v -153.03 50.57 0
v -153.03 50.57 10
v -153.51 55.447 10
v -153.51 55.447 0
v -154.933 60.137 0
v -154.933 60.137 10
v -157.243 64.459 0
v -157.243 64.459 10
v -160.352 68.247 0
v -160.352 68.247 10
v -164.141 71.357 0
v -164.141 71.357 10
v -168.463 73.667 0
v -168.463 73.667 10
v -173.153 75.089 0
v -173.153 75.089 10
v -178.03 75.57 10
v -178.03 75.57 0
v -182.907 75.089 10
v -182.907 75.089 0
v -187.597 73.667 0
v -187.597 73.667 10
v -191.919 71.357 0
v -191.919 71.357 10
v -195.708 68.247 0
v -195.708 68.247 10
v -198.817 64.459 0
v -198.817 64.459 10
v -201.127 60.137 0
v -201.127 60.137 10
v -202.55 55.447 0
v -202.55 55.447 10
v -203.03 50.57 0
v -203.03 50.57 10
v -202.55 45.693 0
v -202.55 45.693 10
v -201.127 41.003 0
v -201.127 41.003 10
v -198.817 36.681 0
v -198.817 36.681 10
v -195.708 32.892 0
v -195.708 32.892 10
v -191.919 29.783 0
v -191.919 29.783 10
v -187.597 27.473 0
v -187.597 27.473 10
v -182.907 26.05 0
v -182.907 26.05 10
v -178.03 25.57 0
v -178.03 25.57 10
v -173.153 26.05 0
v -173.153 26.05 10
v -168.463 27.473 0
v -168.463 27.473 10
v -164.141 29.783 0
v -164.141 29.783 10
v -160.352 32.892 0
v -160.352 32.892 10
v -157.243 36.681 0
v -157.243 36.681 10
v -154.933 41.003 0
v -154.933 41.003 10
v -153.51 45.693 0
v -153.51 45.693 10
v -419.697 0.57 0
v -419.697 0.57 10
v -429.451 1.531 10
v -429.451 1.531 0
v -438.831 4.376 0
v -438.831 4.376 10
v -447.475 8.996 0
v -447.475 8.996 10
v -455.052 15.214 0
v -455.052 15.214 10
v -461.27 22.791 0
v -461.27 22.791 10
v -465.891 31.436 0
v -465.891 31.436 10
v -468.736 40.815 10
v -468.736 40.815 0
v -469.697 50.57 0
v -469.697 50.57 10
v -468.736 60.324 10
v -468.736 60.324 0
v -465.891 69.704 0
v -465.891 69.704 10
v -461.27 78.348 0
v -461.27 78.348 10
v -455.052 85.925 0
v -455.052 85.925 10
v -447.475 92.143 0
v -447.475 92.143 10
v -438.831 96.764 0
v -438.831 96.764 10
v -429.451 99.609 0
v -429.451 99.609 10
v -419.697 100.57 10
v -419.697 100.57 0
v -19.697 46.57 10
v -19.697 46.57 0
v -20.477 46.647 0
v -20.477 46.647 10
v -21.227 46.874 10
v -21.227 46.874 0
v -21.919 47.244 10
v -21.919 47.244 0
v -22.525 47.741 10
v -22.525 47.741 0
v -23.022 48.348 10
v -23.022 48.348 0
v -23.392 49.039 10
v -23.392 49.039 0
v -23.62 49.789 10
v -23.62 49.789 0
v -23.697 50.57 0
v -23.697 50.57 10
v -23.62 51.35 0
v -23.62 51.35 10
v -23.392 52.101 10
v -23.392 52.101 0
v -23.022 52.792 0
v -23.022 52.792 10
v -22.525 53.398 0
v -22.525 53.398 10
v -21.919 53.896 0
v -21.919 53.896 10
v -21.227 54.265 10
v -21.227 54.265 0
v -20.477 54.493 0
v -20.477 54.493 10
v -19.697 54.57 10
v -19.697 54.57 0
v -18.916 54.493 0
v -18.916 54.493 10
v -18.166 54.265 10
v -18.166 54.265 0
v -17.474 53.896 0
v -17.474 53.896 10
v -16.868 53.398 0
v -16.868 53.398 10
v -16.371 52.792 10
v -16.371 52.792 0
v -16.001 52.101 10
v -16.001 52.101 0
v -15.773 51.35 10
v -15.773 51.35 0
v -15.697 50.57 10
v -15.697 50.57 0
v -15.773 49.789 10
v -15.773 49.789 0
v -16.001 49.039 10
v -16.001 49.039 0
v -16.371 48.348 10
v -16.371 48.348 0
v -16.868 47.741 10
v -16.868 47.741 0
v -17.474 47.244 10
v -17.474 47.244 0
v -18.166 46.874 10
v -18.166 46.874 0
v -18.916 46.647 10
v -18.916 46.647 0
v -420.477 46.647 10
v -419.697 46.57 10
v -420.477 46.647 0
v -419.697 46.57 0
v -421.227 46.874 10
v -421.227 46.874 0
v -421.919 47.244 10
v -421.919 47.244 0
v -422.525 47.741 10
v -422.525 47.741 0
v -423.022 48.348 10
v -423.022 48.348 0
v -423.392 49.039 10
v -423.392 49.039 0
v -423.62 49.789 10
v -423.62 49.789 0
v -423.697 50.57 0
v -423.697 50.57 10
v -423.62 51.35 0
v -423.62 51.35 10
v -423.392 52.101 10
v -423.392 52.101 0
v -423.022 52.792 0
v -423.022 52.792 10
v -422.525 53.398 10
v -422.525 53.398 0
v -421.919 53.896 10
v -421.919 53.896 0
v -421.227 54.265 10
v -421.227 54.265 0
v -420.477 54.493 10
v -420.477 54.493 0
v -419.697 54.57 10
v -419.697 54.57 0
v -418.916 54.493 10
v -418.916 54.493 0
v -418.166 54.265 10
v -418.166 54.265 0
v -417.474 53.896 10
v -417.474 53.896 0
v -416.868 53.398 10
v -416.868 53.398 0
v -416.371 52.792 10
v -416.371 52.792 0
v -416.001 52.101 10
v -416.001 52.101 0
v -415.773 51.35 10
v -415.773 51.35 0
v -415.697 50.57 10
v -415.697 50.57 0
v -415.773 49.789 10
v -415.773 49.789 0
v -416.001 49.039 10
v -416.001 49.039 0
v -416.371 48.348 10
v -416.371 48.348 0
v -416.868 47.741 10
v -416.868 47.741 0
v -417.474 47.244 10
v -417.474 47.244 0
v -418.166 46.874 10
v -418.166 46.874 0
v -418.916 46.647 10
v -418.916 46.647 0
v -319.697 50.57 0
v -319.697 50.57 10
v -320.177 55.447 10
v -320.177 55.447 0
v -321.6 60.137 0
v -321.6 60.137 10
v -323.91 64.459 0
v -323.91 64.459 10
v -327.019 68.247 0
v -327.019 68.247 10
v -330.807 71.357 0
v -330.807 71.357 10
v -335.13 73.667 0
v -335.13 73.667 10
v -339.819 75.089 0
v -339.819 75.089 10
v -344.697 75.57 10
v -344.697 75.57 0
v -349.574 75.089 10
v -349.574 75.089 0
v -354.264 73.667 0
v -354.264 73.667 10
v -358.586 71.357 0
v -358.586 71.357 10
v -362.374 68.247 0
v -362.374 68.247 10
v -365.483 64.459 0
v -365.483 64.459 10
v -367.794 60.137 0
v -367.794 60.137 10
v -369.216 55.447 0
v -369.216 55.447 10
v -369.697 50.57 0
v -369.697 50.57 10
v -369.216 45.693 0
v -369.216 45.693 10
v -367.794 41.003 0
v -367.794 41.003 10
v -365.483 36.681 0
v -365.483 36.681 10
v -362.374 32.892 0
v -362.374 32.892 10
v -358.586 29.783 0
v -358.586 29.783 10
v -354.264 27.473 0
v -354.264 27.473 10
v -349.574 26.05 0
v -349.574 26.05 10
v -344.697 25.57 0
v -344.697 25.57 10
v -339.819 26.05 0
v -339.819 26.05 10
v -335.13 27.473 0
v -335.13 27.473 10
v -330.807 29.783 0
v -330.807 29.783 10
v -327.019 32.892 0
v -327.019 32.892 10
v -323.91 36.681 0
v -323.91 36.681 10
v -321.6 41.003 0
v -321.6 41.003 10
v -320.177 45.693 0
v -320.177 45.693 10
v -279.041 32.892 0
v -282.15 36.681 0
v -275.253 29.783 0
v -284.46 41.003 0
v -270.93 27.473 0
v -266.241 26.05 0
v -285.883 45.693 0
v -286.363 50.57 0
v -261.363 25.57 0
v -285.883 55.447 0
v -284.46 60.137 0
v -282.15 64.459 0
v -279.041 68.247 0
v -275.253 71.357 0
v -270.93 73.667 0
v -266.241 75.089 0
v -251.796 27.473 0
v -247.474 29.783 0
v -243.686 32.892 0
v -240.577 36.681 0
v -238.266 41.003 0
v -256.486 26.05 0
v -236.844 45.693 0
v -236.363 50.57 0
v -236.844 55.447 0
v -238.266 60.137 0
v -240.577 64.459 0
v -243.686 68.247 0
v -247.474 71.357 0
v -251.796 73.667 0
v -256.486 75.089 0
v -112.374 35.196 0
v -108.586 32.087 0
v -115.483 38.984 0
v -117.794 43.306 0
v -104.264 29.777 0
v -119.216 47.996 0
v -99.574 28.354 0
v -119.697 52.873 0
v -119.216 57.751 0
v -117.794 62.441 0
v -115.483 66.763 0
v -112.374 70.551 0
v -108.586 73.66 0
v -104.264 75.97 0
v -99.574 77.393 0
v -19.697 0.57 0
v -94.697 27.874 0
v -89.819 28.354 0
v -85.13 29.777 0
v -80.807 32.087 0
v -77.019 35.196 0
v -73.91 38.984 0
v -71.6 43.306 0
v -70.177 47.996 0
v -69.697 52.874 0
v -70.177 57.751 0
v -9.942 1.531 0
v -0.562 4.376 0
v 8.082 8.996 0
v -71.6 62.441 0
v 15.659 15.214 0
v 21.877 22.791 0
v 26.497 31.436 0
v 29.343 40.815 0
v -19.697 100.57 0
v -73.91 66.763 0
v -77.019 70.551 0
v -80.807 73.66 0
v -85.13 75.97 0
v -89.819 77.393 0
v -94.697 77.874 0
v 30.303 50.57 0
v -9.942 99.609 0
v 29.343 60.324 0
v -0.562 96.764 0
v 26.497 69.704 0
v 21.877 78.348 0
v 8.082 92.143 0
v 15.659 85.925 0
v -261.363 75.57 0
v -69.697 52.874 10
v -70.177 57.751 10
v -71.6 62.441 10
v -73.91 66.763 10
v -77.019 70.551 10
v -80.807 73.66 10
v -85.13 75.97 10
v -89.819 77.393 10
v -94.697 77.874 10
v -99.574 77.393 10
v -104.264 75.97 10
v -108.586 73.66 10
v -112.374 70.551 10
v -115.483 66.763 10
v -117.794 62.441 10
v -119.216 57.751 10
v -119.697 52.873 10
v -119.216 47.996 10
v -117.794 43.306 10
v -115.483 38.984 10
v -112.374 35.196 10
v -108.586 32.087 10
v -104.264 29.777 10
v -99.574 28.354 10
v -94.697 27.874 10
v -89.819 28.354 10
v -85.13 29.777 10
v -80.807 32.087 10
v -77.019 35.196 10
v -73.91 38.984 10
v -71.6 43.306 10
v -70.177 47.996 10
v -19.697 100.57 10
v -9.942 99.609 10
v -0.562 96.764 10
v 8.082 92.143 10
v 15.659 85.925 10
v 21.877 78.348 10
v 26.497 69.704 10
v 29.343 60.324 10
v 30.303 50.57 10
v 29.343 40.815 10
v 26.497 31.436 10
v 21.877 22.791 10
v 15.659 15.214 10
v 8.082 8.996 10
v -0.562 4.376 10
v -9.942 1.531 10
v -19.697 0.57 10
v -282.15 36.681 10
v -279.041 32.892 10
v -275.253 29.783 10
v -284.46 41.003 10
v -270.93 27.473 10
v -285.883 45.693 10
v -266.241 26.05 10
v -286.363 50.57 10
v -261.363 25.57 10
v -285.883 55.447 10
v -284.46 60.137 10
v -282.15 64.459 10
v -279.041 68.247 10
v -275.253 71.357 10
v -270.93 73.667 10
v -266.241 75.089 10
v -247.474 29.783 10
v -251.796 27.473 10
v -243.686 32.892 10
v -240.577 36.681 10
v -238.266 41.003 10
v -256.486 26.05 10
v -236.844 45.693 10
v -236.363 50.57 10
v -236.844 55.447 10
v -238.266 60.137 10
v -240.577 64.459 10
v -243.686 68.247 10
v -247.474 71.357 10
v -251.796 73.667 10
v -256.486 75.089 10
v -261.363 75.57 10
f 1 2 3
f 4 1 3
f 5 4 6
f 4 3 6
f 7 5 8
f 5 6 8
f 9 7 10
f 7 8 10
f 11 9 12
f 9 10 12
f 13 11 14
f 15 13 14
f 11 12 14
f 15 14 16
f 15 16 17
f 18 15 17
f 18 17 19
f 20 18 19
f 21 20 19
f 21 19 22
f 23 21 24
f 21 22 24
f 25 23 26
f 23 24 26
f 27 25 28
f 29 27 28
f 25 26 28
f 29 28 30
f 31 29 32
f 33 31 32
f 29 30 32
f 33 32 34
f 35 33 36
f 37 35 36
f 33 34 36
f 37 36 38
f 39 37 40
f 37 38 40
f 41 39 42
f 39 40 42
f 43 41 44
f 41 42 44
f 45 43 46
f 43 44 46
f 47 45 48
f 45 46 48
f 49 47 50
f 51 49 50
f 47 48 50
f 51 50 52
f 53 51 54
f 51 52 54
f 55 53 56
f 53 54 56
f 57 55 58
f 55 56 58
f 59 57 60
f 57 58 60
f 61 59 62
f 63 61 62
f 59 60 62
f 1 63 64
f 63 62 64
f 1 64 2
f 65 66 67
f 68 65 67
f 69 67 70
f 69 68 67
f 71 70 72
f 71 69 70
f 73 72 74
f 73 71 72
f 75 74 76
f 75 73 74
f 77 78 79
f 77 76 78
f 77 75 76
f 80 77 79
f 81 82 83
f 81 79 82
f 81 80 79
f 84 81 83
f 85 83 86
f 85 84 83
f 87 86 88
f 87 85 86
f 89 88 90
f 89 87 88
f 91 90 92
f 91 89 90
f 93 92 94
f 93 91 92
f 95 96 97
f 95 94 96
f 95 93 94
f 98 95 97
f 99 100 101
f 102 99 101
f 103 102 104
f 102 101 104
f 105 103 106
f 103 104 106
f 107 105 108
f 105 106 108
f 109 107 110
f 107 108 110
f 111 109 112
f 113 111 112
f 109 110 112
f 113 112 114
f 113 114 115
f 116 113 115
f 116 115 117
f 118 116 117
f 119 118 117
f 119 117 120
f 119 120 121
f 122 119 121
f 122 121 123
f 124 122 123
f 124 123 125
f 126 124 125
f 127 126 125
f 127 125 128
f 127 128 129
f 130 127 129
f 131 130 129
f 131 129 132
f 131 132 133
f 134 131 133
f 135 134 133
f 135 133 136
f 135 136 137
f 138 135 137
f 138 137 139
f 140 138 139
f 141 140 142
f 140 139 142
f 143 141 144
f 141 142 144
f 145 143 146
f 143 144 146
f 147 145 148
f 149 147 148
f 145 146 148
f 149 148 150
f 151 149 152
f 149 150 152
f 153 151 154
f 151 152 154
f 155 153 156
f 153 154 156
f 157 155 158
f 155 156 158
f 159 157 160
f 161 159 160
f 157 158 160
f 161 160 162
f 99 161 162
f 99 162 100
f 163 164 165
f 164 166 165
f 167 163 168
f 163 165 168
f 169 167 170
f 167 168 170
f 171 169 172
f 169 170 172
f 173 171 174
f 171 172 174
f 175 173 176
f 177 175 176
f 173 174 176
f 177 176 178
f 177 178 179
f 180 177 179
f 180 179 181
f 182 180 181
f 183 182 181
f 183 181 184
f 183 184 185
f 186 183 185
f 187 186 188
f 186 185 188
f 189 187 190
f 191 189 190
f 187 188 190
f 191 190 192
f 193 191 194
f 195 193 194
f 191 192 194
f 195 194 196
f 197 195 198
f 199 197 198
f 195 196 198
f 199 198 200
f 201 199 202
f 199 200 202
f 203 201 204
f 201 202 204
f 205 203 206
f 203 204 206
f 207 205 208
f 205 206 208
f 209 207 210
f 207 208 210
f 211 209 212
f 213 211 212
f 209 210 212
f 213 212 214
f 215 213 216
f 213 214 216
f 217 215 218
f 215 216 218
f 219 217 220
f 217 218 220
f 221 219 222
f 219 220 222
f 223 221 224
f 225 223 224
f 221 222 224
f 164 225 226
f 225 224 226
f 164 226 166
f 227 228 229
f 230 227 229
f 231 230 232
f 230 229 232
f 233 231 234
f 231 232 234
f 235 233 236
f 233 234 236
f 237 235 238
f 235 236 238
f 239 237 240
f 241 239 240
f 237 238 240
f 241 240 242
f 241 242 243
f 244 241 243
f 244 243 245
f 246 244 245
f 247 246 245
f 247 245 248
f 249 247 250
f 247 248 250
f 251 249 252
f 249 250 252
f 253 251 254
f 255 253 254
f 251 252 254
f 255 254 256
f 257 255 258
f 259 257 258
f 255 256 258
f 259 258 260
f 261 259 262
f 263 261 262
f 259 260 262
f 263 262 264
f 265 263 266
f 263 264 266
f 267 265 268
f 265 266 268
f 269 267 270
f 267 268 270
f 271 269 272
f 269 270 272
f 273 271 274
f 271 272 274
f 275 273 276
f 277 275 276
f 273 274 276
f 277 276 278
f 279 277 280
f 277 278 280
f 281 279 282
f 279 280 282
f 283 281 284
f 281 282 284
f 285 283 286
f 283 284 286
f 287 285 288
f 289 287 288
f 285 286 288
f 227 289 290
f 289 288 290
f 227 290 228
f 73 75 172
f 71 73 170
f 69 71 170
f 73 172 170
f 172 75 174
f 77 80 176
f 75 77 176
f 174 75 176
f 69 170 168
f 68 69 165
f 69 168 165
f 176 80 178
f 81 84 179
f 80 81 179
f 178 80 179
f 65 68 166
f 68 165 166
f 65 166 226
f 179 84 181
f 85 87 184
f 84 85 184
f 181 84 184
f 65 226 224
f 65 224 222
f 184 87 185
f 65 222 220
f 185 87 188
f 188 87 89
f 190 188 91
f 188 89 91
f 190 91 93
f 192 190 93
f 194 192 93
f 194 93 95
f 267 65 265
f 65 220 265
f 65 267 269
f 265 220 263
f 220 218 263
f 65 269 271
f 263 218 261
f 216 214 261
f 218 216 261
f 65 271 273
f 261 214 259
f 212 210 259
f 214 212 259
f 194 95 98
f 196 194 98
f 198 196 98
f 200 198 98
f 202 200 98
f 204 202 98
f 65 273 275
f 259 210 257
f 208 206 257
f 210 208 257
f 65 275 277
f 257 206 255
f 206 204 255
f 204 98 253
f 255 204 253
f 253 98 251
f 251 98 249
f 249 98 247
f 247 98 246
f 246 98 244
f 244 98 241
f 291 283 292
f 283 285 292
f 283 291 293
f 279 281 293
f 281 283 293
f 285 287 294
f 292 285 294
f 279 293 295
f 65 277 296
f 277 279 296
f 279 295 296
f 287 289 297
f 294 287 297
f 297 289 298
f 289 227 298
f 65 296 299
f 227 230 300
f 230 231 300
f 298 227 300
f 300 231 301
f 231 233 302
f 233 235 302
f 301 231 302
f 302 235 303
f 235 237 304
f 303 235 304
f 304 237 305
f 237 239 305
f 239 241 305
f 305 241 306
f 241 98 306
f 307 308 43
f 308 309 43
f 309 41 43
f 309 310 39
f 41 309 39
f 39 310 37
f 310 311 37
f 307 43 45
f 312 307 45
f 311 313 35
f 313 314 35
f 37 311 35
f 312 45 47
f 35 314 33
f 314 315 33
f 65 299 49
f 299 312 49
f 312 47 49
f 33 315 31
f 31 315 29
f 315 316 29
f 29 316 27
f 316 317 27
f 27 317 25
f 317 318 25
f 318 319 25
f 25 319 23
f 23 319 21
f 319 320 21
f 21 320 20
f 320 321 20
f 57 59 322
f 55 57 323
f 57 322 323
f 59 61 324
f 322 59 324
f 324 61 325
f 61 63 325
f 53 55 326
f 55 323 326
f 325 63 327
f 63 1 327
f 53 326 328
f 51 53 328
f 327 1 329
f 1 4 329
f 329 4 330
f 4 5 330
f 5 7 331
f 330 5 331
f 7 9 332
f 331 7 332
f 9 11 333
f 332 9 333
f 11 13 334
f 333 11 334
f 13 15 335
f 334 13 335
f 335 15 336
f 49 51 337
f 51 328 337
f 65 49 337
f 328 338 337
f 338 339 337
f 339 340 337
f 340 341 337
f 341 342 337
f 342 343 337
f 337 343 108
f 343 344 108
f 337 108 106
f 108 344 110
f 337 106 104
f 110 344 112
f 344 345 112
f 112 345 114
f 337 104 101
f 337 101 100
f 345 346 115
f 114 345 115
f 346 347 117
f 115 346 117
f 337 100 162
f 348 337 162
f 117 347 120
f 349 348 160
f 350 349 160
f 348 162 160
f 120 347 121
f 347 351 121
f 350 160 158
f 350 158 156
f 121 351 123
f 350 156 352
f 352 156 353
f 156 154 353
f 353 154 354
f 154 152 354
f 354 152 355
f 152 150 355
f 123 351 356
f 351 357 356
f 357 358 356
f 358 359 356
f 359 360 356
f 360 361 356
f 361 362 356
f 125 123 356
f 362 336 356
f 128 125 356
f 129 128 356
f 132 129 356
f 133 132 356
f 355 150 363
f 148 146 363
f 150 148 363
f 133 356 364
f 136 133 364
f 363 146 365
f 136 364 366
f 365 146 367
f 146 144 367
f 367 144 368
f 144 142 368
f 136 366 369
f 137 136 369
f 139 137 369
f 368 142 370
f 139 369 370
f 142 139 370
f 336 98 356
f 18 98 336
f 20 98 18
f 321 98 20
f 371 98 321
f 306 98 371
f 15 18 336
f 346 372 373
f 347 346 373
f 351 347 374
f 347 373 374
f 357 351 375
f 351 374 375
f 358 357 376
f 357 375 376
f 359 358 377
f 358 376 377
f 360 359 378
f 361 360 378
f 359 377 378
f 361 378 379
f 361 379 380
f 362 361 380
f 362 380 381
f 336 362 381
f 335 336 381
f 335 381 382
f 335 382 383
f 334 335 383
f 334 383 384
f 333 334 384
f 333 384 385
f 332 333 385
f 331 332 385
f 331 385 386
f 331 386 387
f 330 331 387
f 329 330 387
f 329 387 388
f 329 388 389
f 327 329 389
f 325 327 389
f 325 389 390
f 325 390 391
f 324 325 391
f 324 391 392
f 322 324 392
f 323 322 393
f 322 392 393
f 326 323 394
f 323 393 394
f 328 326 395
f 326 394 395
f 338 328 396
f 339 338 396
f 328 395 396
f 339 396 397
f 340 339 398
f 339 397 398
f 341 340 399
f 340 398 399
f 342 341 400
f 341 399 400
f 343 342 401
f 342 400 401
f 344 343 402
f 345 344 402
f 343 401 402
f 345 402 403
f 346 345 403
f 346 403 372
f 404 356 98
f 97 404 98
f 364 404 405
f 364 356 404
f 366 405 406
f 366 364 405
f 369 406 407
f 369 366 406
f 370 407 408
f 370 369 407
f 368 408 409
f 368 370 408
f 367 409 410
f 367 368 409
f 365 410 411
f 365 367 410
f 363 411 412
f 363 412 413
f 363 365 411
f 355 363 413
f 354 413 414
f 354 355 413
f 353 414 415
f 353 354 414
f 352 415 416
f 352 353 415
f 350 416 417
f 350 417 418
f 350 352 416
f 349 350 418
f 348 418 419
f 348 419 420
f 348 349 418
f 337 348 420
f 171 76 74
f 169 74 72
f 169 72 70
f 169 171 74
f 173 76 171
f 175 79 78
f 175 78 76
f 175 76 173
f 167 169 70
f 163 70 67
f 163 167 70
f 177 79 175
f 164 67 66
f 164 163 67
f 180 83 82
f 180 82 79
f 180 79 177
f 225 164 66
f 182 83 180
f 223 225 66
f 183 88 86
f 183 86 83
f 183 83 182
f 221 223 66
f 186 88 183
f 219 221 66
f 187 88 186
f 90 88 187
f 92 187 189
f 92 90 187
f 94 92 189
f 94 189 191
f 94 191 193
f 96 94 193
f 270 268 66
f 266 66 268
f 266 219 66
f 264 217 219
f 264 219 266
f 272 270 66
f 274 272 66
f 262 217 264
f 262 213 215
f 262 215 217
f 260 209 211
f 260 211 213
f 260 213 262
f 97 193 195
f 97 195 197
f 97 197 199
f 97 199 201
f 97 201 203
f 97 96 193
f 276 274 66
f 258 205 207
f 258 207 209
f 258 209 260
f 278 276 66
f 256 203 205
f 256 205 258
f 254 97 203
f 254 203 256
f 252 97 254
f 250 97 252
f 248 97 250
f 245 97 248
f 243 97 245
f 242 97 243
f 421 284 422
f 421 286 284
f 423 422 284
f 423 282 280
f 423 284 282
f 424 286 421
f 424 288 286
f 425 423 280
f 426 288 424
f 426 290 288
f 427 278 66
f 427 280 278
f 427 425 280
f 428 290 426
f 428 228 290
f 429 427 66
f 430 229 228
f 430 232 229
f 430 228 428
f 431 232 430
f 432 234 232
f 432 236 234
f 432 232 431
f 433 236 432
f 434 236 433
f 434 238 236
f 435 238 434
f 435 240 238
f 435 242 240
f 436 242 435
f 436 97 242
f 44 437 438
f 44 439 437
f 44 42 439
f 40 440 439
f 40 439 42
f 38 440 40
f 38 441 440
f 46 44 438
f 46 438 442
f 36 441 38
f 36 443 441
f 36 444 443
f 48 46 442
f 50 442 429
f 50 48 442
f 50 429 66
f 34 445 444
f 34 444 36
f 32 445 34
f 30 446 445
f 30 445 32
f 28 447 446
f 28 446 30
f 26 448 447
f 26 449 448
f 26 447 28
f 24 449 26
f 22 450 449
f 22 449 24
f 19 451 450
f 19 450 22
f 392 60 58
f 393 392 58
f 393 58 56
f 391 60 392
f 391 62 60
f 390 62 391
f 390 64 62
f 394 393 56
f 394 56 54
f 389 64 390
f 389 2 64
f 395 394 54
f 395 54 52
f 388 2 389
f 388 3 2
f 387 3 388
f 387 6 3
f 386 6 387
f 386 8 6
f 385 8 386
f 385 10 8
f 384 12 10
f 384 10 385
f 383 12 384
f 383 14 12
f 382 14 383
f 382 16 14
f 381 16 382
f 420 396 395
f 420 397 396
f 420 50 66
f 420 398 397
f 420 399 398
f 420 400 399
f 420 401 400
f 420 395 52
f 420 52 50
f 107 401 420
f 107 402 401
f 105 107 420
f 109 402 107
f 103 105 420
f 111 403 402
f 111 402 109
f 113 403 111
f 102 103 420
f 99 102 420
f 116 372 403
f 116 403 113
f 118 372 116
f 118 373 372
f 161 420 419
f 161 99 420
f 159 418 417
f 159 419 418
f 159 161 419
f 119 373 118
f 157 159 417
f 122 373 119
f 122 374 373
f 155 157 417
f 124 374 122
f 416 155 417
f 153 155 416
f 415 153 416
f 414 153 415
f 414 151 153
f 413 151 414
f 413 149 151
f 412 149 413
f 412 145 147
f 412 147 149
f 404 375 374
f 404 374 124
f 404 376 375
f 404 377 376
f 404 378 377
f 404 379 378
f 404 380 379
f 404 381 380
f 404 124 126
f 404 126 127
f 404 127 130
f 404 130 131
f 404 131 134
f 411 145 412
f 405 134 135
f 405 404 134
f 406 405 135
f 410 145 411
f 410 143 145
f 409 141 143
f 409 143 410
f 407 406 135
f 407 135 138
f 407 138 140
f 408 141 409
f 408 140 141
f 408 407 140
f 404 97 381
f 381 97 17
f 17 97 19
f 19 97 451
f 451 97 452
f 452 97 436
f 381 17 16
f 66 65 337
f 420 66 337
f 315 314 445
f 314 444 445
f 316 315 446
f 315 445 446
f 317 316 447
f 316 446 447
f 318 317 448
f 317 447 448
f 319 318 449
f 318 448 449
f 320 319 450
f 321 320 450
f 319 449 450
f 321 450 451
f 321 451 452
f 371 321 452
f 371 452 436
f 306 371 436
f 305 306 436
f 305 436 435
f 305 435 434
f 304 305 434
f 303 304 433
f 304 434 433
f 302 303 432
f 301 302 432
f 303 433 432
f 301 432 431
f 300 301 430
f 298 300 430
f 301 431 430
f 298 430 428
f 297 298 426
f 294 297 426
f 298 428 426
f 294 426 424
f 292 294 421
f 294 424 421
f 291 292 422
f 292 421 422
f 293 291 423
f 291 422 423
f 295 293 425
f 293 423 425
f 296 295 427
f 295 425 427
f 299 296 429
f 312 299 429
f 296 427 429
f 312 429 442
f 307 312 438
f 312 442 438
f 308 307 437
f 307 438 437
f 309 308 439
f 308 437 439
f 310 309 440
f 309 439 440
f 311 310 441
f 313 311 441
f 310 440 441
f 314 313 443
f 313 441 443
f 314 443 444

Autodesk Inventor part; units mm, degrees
ref_plane "YZ Plane" through (0, 0, 0) normal (1, 0, 0) x (0, 1, 0)
ref_plane "XZ Plane" through (0, 0, 0) normal (0, 1, 0) x (-1, 0, 0)
ref_plane "XY Plane" through (0, 0, 0) normal (0, 0, 1) x (1, 0, 0)
sketch "Sketch1" plane through (0, 0, 0) normal (0, 0, 1) x (1, 0, 0)
  line L0 (-419.6966, 0.5698) -> (-19.6966, 0.5698)
  line L1 (-19.6966, 0.5698) -> (-19.6966, 100.5698)
  line L2 (-19.6966, 100.5698) -> (-419.6966, 100.5698)
  line L3 (-419.6966, 100.5698) -> (-419.6966, 0.5698)
  circle A0 centre (-419.6966, 50.5698) radius 50
  circle A1 centre (-19.6966, 50.5698) radius 50
  dimension "d12" = 400
  dimension "d13" = 100
  dimension "d14" = 100
  dimension "d15" = 100
extrude "Extrusion1" add sketch "Sketch1" along normal blind 10
sketch "Sketch2" plane through (0, 0, 10) normal (0, 0, 1) x (1, 0, 0)
  arc A0 (-419.6966, 100.5698) -> (-419.6966, 0.5698) centre (-419.6966, 50.5698) ccw projected
  arc A1 (-19.6966, 0.5698) -> (-19.6966, 100.5698) centre (-19.6966, 50.5698) ccw projected
  point P0 (0, 0)
hole "Hole1" at (-419.6966, 50.5698, 10) at (-19.6966, 50.5698, 10) direction (0, 0, -1) diameter 8 end through all
sketch "Sketch3" plane through (0, 0, 10) normal (0, 0, 1) x (1, 0, 0)
  circle A0 centre (-19.6966, 50.5698) radius 4 projected
  circle A1 centre (-419.6966, 50.5698) radius 4 projected
  line L0 (-19.6966, 0.5698) -> (-419.6966, 0.5698) projected
  circle A2 centre (-344.6966, 50.5698) radius 25
  circle A3 centre (-261.3633, 50.5698) radius 25
  circle A4 centre (-178.03, 50.5698) radius 25
  circle A5 centre (-94.6966, 52.8735) radius 25
  point P0 (0, 0)
  dimension "d16" = 50
  dimension "d17" = 50
  dimension "d18" = 50
  dimension "d19" = 50
  dimension "d20" = 83.3333
  dimension "d21" = 83.3333
  dimension "d22" = 83.3333
  dimension "d23" = 50
  dimension "d24" = 75
  dimension "d25" = 400
extrude "Extrusion2" cut sketch "Sketch3" against normal through all contours A2 | A3 | A4 | A5
equation "\"d14\" = d13"
equation "\"d15\" = d13"
equation "\"d17\" = d16"
equation "\"d18\" = d16"
equation "\"d19\" = d16"
equation "\"d20\" = -0.666667 * d24 + 0.333333 * d25"
equation "\"d21\" = d20"
equation "\"d22\" = d20"
properties part number "outer drive side"
